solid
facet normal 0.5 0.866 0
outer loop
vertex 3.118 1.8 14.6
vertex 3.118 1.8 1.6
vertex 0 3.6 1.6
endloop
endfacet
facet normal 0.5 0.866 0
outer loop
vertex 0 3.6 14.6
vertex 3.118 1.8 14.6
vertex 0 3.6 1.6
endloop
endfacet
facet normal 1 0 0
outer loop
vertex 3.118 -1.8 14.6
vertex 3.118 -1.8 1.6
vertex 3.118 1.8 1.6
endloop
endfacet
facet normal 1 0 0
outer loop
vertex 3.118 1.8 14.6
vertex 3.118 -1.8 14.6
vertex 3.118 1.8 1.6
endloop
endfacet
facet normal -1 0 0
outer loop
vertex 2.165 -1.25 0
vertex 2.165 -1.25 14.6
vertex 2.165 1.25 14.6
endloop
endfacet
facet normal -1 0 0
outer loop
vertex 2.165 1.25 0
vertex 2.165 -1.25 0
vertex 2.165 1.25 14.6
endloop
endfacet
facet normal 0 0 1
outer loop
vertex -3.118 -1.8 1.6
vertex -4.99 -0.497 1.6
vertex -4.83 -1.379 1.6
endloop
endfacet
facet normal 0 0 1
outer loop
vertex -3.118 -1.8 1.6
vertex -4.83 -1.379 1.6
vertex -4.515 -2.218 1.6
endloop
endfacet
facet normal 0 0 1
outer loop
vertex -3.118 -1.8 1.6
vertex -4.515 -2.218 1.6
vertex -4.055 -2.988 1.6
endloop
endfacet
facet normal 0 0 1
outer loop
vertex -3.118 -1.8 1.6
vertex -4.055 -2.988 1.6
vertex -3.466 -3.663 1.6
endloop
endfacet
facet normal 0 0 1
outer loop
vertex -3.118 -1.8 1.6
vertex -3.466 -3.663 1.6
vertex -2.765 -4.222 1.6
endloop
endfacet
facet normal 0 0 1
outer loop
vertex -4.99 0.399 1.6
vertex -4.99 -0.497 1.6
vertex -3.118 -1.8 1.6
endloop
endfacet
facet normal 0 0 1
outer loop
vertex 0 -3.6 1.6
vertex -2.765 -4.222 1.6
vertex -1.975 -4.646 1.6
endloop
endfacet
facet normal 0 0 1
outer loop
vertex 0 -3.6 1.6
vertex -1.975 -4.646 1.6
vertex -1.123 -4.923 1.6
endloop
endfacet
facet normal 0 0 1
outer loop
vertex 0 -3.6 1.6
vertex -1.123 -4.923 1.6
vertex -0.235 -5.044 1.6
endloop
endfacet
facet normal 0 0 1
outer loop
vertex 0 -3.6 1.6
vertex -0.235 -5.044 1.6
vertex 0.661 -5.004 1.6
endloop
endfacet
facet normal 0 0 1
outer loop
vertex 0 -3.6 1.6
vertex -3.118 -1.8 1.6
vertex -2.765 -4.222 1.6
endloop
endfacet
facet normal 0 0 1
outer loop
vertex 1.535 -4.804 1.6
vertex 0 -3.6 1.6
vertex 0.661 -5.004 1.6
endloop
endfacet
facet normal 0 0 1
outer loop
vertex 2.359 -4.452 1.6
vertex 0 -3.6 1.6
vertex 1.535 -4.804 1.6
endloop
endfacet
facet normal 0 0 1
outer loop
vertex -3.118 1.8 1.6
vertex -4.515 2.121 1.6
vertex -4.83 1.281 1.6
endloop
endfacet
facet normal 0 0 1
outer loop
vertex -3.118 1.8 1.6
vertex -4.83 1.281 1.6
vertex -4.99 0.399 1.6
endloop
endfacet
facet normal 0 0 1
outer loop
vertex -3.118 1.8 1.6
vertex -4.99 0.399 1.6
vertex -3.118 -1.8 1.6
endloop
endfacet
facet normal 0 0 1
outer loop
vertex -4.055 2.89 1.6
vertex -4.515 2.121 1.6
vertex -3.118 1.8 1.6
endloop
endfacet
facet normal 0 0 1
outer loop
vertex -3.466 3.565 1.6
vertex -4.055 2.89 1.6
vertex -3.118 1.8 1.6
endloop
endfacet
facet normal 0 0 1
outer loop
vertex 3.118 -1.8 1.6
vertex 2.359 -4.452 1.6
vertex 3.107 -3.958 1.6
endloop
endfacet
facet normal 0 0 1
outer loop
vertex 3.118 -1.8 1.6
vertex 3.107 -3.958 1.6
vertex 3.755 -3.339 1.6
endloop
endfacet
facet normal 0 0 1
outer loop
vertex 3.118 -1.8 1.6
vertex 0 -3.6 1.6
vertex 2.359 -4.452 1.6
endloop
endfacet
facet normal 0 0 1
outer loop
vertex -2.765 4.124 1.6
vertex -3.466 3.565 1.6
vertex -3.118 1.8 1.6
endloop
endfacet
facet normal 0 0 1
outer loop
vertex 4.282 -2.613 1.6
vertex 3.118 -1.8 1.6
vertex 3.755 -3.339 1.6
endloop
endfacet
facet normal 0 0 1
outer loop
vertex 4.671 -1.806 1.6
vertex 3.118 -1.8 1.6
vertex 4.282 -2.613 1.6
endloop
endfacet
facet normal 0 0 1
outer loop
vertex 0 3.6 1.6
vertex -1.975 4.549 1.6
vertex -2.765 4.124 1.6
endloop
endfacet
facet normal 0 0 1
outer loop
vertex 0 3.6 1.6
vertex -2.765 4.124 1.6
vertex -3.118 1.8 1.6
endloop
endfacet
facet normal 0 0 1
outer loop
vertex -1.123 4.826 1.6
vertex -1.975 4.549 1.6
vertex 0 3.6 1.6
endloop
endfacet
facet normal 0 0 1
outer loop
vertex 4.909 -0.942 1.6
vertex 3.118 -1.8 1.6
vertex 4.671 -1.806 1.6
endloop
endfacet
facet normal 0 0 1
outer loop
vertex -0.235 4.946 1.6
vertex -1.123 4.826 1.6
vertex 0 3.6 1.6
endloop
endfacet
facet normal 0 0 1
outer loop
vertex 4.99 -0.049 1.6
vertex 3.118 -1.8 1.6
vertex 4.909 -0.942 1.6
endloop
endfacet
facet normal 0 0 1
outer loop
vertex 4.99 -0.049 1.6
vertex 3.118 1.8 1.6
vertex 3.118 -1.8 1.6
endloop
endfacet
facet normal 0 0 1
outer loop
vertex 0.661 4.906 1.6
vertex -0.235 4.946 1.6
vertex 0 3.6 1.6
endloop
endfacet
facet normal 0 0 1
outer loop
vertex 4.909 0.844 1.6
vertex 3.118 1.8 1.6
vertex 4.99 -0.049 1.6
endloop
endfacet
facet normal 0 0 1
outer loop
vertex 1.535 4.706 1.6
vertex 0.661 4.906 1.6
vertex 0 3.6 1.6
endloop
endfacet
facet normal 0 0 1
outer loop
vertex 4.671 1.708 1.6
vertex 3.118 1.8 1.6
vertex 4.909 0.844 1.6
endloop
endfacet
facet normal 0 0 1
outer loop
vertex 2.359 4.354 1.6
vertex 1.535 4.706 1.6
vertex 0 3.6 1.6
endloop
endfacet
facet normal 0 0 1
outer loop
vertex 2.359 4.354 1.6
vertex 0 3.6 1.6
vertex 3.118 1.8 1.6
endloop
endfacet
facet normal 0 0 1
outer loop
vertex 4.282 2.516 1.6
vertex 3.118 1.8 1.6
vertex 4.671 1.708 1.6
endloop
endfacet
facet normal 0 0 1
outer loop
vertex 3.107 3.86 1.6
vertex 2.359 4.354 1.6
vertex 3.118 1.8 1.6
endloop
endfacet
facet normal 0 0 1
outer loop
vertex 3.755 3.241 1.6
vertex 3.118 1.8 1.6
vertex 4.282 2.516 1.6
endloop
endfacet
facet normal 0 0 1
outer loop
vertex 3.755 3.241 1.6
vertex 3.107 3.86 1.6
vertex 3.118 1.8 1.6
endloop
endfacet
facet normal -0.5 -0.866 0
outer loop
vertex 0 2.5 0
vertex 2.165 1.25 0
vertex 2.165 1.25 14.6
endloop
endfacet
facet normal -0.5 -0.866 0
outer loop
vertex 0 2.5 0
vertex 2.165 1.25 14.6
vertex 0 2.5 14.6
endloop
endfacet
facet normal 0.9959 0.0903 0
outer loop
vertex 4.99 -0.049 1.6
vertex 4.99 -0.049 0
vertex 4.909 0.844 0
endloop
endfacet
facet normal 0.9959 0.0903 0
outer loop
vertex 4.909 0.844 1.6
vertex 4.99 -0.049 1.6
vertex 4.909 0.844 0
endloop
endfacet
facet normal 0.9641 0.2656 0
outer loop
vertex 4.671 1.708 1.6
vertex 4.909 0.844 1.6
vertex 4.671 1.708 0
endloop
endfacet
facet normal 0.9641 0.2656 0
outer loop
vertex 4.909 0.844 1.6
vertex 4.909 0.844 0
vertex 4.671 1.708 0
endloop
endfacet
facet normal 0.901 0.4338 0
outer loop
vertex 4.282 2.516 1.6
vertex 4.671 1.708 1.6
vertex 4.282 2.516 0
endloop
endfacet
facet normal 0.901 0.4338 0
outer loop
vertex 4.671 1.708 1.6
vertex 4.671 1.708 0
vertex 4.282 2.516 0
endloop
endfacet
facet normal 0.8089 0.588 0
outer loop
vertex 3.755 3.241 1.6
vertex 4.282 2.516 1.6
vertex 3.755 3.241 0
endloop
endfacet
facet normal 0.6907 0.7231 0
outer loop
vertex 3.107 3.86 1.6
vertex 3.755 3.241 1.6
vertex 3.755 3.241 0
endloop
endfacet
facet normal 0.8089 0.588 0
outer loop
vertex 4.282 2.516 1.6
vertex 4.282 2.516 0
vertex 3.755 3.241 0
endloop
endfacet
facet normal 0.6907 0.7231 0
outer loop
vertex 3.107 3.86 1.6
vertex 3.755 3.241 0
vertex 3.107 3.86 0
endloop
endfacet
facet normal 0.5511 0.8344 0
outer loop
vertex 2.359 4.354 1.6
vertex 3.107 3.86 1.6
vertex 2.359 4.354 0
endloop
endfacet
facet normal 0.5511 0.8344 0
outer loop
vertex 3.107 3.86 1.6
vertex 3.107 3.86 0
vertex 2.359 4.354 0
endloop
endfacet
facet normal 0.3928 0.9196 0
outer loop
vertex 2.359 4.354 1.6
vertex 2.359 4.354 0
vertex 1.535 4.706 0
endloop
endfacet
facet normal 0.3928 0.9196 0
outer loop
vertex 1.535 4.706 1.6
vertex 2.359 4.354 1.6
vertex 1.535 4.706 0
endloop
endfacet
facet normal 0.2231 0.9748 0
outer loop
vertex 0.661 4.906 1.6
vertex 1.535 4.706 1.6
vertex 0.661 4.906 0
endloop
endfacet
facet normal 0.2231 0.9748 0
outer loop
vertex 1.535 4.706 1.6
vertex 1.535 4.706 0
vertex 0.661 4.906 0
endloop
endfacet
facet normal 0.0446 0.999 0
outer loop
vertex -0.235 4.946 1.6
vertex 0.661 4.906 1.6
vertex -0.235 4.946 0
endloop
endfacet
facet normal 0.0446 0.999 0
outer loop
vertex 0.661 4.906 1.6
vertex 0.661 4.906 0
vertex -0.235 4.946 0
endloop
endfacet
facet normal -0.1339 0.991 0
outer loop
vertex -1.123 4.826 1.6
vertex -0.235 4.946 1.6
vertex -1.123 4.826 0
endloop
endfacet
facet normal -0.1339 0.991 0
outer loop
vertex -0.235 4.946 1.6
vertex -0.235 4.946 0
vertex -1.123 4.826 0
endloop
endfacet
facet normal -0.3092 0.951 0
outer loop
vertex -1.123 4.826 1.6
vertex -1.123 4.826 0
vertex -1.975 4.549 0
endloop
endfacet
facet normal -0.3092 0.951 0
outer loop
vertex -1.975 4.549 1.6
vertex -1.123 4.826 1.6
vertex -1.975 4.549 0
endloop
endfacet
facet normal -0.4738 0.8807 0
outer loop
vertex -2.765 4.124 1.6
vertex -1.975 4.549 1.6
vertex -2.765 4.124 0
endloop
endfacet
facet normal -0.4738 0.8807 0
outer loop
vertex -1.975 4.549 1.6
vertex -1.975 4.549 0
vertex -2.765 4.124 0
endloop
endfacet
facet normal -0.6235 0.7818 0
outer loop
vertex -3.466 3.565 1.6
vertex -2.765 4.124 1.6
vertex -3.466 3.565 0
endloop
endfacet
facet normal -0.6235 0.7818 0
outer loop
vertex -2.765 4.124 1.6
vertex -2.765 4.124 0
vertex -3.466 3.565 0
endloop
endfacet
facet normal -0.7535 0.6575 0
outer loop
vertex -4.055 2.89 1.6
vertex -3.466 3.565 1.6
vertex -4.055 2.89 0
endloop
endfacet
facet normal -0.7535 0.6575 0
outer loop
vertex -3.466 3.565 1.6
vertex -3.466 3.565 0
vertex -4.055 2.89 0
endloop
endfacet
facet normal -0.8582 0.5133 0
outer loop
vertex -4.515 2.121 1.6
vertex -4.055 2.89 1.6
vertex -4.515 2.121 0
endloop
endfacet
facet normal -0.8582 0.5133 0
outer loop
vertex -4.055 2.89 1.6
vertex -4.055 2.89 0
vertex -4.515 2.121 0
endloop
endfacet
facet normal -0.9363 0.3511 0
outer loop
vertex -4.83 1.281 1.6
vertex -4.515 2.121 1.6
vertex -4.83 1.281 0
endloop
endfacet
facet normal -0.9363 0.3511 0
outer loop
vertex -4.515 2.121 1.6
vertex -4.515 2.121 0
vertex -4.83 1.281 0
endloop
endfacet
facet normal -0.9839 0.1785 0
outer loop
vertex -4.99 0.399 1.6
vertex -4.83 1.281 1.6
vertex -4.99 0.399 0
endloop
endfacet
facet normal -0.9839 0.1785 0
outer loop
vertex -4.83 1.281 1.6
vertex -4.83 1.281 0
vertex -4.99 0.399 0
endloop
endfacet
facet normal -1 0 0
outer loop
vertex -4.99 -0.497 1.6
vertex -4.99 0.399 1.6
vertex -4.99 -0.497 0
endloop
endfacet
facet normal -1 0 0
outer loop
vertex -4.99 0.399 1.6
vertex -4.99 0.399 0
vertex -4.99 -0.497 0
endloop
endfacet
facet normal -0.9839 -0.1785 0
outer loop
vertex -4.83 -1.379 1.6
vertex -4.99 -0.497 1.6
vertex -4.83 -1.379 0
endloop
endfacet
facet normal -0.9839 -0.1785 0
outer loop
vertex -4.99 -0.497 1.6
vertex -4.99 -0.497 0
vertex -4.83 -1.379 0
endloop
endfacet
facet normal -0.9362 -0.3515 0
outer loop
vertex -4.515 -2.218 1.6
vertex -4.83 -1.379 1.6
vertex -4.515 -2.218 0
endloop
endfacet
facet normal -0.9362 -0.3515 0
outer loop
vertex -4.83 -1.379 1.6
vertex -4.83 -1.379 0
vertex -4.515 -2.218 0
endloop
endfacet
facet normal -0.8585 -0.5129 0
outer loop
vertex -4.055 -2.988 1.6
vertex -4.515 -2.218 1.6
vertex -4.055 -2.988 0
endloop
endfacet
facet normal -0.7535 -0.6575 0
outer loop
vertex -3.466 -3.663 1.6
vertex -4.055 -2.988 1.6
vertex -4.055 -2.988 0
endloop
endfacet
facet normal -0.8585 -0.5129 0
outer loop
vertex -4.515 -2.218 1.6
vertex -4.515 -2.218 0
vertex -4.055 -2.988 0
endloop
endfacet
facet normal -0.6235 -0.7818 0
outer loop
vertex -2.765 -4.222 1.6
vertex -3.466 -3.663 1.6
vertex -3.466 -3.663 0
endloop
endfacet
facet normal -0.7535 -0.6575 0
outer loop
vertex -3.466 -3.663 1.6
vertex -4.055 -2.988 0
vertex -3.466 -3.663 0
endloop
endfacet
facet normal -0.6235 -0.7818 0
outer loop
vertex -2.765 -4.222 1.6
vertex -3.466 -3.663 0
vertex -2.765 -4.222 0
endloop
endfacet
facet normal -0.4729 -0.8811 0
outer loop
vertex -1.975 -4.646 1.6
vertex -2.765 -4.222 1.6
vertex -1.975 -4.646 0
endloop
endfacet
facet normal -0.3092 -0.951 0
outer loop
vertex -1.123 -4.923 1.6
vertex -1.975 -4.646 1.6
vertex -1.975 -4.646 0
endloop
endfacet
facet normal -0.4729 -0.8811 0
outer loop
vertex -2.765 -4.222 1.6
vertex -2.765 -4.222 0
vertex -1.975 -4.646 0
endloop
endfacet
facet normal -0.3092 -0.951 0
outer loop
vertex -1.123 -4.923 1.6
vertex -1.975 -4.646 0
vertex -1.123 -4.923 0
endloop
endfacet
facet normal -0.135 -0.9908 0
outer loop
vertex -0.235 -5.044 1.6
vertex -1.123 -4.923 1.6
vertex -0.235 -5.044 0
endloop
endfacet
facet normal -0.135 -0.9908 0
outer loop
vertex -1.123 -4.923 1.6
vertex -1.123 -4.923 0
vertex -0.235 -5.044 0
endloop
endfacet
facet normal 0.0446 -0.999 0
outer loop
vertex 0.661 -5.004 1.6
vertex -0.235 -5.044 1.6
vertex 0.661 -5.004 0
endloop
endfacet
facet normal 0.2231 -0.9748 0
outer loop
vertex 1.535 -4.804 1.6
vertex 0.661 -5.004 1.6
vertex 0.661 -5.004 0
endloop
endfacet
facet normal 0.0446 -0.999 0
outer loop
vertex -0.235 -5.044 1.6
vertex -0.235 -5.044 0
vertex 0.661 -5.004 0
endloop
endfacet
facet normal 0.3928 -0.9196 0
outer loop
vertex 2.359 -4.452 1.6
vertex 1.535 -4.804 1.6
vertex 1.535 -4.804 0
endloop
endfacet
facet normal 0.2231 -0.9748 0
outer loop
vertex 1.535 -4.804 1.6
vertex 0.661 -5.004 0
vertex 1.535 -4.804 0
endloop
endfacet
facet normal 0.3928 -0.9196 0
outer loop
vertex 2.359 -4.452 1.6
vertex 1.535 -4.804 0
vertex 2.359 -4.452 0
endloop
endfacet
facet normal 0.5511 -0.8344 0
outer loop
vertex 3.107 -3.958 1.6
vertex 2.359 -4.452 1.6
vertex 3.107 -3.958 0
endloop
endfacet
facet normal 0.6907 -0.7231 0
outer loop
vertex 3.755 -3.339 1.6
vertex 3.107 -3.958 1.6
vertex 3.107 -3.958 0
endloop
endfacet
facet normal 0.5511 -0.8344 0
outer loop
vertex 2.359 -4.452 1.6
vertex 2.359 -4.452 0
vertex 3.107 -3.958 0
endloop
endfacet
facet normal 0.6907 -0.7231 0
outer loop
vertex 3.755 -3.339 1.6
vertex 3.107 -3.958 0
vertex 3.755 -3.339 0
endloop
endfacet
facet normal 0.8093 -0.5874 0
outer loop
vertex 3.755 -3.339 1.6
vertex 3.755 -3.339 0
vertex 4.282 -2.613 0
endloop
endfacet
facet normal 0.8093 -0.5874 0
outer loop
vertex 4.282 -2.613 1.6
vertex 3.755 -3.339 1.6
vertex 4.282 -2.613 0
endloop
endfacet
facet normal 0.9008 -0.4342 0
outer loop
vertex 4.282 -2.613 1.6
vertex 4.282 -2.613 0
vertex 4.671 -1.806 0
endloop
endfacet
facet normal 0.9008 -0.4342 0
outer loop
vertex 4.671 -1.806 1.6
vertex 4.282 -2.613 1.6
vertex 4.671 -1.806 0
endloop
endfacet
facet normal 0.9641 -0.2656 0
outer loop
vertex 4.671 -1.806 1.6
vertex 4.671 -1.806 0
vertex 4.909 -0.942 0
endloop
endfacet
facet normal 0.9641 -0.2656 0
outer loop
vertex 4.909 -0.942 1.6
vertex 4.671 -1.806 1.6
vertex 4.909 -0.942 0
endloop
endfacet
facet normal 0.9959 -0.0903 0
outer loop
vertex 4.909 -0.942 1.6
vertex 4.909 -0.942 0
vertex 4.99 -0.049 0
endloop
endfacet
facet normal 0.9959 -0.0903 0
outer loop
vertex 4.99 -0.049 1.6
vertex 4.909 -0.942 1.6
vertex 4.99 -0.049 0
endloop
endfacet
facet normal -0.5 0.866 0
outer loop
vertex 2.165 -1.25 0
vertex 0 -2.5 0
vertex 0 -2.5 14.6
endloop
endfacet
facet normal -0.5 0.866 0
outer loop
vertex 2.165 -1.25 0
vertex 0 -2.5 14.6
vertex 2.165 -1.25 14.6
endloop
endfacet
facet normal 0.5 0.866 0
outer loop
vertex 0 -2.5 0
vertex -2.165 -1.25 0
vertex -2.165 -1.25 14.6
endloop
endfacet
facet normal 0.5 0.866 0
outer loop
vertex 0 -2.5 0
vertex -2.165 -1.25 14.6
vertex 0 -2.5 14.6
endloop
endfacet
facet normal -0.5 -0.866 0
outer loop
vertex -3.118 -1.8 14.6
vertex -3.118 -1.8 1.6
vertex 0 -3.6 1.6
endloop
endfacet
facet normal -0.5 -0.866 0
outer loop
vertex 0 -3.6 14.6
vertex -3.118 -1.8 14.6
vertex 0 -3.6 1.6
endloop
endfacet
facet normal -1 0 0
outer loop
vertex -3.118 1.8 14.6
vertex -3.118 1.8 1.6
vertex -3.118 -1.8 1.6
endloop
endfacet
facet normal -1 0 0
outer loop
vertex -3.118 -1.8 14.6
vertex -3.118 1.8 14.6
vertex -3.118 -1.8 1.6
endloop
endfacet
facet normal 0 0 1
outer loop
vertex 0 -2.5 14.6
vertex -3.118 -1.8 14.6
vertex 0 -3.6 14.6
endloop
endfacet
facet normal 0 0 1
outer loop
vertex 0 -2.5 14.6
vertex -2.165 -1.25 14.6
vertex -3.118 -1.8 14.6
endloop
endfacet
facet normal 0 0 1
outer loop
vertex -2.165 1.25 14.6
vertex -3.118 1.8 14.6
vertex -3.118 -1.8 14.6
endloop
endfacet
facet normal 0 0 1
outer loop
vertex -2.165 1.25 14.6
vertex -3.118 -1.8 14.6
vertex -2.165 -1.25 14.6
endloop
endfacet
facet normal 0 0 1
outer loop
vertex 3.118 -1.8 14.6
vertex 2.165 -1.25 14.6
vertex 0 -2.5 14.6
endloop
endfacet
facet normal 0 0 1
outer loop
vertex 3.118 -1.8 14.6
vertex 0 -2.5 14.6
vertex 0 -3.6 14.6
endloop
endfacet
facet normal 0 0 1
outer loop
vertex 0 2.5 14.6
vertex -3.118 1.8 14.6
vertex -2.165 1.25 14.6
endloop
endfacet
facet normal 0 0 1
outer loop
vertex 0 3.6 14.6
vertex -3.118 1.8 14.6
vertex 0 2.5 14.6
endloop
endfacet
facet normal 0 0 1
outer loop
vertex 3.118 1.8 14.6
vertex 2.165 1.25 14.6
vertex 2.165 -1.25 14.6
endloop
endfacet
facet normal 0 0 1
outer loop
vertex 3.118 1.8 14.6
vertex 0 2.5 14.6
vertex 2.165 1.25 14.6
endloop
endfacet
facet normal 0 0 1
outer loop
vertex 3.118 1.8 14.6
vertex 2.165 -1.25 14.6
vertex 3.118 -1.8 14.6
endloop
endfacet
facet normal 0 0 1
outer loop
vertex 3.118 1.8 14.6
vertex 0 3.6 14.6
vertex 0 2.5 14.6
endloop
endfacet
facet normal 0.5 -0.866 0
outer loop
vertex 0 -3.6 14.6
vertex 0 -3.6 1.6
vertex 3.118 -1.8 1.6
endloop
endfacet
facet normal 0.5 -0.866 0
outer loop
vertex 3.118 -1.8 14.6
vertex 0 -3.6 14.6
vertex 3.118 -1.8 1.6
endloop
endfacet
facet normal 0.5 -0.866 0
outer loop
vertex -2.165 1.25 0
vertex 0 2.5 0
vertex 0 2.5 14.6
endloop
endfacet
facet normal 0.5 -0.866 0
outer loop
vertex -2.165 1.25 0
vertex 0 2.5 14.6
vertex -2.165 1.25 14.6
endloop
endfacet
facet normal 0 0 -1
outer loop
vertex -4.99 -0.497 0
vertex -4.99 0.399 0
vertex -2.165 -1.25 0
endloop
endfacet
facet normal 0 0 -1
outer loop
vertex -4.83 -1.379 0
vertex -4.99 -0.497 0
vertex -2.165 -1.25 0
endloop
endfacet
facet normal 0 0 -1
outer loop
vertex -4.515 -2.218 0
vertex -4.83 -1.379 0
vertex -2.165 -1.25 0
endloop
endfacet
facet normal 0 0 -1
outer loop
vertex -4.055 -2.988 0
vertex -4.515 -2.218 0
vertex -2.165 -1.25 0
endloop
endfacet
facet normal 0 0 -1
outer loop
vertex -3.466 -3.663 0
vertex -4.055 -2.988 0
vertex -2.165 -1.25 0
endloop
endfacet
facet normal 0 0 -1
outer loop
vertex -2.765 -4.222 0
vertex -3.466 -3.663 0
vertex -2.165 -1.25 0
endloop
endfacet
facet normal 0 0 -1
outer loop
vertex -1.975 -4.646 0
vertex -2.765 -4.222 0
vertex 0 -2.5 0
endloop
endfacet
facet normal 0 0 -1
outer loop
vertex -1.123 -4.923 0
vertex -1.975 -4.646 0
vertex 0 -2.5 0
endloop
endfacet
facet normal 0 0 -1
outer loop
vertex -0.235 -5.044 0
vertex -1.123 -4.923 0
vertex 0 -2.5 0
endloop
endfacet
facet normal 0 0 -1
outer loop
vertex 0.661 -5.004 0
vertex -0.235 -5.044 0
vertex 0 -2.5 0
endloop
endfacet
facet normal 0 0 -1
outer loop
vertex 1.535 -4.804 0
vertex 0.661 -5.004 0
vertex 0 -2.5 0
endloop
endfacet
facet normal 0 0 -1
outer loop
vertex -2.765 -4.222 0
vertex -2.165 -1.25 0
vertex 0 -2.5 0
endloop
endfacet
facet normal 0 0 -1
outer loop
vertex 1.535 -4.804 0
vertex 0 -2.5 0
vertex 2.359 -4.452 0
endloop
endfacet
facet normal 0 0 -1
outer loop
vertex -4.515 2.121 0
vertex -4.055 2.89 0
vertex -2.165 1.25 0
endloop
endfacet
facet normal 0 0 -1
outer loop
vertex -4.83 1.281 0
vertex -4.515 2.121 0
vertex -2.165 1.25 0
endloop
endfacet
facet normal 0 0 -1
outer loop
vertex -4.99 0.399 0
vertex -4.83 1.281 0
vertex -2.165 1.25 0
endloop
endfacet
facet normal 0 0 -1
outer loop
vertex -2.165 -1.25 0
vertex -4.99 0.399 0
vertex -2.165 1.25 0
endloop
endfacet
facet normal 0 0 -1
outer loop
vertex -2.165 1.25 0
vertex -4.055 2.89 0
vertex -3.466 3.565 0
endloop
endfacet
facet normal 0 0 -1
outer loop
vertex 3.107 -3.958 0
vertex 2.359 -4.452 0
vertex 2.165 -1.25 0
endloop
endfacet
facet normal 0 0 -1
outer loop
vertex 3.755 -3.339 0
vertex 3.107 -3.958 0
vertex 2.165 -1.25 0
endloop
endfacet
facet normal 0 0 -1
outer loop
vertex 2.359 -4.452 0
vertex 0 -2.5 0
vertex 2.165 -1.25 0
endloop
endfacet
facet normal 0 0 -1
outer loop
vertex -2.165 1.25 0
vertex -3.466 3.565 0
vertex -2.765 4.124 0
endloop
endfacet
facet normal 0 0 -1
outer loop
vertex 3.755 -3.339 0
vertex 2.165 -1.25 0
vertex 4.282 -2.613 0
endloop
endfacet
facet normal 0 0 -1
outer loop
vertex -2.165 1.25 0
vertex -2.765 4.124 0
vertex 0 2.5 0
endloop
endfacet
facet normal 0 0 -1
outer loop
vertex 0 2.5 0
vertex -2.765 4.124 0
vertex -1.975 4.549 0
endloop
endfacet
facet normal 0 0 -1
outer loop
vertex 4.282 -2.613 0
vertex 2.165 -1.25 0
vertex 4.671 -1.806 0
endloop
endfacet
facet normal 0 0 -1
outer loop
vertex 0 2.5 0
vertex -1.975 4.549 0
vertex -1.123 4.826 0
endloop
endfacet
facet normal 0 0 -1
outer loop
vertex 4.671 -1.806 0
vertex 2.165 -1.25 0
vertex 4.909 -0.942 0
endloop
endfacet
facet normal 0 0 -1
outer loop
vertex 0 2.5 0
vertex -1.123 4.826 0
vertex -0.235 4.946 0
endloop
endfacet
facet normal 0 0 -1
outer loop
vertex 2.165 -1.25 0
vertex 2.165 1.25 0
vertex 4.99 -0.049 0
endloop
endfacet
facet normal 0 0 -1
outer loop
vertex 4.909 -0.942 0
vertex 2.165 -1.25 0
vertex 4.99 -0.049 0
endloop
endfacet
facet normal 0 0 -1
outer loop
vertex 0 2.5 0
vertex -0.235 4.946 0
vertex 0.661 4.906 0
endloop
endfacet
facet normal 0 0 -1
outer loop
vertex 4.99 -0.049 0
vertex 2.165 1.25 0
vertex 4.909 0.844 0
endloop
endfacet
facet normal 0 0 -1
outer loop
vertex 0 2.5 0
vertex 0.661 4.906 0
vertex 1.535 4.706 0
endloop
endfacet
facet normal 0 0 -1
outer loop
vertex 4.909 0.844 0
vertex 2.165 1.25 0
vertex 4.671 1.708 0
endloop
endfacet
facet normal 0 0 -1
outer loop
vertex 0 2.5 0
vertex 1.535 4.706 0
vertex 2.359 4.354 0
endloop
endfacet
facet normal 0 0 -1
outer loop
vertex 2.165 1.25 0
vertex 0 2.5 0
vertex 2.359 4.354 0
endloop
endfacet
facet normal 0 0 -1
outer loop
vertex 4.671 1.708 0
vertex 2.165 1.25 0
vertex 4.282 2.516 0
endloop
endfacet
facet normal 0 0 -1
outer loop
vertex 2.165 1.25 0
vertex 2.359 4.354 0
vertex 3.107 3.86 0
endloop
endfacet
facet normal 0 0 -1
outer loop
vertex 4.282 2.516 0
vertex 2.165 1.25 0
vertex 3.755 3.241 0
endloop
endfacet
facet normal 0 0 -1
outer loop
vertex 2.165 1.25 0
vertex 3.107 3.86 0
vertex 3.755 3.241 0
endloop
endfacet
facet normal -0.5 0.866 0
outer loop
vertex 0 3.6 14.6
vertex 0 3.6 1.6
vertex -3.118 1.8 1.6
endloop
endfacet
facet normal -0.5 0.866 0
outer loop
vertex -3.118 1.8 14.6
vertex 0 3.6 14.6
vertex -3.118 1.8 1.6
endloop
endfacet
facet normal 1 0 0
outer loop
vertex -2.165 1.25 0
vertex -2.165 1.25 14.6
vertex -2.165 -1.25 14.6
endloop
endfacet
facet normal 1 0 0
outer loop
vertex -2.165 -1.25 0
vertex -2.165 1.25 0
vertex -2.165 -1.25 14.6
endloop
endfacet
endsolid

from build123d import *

# Parameters (mm, degrees)
SKETCH_R     = 5
PAD_DEPTH    = 1.6
PAD001_DEPTH = 13


with BuildPart() as part:
    # Sketch → Pad (new body)
    with BuildSketch(Plane.XY):
        with Locations((-0.010221, -0.048828)):
            Circle(SKETCH_R)
        Polygon((2.165064, -1.25), (2.165064, 1.25), (0, 2.5), (-2.165064, 1.25), (-2.165064, -1.25), (0, -2.5), align=None, mode=Mode.SUBTRACT)
    extrude(amount=PAD_DEPTH)

    # Sketch001 → Pad001 (new body)
    with BuildSketch(Plane.XY.offset(1.6)):
        Polygon((3.117691, -1.8), (3.117691, 1.8), (0, 3.6), (-3.117691, 1.8), (-3.117691, -1.8), (0, -3.6), align=None)
        Polygon((2.165064, -1.25), (2.165064, 1.25), (0, 2.5), (-2.165064, 1.25), (-2.165064, -1.25), (0, -2.5), align=None, mode=Mode.SUBTRACT)
    extrude(amount=PAD001_DEPTH)


solid = part.part
